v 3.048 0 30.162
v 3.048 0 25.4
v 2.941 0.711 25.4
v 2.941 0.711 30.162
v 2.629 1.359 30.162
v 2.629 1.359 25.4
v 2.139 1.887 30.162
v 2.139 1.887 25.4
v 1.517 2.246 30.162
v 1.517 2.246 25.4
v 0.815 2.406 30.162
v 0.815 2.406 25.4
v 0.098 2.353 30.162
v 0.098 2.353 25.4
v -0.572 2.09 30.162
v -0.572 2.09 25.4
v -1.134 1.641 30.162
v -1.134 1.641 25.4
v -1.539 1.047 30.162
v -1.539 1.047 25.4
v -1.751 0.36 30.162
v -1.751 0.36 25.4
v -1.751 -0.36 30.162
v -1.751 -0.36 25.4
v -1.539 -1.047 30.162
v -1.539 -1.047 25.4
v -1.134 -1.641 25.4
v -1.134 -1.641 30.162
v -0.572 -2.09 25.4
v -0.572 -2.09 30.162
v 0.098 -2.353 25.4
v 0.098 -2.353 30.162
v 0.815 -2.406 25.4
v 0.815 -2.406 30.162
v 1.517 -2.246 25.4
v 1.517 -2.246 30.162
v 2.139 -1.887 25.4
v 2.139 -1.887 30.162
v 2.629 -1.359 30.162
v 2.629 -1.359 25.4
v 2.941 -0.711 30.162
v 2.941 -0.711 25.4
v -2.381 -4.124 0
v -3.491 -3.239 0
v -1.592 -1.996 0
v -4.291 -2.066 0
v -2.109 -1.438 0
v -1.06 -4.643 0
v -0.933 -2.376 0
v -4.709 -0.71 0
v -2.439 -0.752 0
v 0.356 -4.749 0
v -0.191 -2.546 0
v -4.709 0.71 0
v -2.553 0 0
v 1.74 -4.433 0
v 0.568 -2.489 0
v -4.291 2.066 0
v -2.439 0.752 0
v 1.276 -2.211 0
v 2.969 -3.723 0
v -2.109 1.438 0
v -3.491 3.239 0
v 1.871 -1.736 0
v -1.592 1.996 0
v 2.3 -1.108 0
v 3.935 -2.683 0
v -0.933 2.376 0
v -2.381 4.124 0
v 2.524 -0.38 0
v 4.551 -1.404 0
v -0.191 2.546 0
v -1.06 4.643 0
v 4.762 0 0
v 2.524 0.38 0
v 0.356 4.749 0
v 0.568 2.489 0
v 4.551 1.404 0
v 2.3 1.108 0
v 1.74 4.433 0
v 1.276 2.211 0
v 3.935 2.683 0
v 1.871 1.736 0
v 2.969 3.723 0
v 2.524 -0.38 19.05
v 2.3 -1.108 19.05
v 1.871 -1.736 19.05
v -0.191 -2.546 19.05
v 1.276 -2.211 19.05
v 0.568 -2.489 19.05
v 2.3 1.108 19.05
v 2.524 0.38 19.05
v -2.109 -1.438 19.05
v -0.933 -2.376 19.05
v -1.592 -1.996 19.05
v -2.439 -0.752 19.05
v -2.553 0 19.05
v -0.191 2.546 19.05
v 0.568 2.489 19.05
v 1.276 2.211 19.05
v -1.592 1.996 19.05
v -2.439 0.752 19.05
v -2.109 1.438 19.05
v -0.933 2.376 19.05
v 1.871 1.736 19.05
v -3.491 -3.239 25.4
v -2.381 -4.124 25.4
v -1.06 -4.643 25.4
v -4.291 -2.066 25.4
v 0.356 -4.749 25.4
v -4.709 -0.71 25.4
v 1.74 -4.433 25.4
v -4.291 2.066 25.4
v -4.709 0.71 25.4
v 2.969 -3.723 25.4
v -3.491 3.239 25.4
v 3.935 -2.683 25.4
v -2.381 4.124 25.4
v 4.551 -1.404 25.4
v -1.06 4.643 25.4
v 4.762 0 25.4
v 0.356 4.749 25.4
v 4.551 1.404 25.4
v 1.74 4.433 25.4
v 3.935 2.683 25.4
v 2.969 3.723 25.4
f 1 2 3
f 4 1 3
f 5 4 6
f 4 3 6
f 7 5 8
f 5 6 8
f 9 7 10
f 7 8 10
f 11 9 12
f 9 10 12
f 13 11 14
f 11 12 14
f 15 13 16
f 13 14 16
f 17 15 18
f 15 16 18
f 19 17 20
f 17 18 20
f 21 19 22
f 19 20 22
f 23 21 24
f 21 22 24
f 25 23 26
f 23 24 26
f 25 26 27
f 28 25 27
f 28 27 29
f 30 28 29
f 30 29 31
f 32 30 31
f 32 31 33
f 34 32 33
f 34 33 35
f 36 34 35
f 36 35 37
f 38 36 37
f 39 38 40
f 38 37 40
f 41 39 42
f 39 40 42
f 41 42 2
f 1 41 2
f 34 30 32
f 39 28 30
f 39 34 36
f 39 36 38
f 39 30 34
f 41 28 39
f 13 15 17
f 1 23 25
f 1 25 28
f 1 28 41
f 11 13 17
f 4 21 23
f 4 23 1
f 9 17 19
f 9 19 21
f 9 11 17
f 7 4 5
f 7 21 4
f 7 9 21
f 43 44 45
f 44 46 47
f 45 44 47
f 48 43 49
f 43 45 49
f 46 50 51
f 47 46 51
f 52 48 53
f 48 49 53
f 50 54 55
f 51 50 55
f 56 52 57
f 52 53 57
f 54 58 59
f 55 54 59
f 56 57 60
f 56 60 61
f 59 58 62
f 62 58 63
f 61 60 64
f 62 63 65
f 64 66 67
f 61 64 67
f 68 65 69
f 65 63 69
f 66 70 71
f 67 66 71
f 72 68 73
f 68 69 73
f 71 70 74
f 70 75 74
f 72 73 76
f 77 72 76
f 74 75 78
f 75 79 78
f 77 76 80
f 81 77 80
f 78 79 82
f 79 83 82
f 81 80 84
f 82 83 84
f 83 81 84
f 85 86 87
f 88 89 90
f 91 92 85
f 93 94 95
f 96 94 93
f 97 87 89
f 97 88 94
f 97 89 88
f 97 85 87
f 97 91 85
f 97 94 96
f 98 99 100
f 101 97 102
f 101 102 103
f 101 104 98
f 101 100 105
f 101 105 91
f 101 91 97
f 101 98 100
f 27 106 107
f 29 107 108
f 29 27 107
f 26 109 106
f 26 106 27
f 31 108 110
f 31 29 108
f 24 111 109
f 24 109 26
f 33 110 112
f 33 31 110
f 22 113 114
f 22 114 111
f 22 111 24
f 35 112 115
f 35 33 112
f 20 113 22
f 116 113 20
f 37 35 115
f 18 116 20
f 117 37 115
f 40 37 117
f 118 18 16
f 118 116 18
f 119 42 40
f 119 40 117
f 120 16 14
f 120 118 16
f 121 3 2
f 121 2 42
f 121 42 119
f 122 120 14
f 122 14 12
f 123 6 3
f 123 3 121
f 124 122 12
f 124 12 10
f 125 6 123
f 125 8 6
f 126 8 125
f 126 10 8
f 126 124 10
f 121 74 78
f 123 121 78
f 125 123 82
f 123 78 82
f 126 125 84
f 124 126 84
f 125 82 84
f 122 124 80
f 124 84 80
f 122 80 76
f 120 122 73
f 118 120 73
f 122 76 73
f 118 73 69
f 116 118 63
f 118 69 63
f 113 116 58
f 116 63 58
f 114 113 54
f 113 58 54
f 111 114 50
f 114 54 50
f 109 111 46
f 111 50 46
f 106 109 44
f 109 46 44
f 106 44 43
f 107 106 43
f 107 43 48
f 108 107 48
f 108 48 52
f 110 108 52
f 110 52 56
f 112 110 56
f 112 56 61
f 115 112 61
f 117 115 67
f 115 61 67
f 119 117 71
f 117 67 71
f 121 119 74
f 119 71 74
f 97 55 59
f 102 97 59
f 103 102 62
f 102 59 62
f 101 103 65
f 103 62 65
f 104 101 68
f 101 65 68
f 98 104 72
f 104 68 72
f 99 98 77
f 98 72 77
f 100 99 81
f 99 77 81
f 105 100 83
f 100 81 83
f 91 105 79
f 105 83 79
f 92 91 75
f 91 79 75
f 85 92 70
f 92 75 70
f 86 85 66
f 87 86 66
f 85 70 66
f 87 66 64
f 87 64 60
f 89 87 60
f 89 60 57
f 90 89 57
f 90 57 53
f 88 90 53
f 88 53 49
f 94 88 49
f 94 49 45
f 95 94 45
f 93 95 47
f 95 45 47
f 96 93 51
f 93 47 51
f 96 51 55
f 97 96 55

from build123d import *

# Parameters (mm, degrees)
SKETCH1_R           = 4.7625
BOSS_EXTRUDE2_DEPTH = 25.4
SKETCH4_R           = 2.413
BOSS_EXTRUDE3_DEPTH = 4.7625
SKETCH5_R           = 2.5527
CUT_EXTRUDE2_DEPTH  = 19.05


with BuildPart() as part:
    # Sketch1 → Boss-Extrude2 (new body)
    with BuildSketch(Plane.XY):
        Circle(SKETCH1_R)
    extrude(amount=BOSS_EXTRUDE2_DEPTH)

    # Sketch4 → Boss-Extrude3 (add)
    with BuildSketch(Plane.XY.offset(25.4)):
        with Locations((0.635, 0)):
            Circle(SKETCH4_R)
    extrude(amount=BOSS_EXTRUDE3_DEPTH)

    # Sketch5 → Cut-Extrude2 (cut)
    with BuildSketch(Plane(origin=(0, 0, 0), x_dir=(-1, 0, 0), z_dir=(0, 0, -1))):
        Circle(SKETCH5_R)
    extrude(amount=-CUT_EXTRUDE2_DEPTH, mode=Mode.SUBTRACT)


solid = part.part
